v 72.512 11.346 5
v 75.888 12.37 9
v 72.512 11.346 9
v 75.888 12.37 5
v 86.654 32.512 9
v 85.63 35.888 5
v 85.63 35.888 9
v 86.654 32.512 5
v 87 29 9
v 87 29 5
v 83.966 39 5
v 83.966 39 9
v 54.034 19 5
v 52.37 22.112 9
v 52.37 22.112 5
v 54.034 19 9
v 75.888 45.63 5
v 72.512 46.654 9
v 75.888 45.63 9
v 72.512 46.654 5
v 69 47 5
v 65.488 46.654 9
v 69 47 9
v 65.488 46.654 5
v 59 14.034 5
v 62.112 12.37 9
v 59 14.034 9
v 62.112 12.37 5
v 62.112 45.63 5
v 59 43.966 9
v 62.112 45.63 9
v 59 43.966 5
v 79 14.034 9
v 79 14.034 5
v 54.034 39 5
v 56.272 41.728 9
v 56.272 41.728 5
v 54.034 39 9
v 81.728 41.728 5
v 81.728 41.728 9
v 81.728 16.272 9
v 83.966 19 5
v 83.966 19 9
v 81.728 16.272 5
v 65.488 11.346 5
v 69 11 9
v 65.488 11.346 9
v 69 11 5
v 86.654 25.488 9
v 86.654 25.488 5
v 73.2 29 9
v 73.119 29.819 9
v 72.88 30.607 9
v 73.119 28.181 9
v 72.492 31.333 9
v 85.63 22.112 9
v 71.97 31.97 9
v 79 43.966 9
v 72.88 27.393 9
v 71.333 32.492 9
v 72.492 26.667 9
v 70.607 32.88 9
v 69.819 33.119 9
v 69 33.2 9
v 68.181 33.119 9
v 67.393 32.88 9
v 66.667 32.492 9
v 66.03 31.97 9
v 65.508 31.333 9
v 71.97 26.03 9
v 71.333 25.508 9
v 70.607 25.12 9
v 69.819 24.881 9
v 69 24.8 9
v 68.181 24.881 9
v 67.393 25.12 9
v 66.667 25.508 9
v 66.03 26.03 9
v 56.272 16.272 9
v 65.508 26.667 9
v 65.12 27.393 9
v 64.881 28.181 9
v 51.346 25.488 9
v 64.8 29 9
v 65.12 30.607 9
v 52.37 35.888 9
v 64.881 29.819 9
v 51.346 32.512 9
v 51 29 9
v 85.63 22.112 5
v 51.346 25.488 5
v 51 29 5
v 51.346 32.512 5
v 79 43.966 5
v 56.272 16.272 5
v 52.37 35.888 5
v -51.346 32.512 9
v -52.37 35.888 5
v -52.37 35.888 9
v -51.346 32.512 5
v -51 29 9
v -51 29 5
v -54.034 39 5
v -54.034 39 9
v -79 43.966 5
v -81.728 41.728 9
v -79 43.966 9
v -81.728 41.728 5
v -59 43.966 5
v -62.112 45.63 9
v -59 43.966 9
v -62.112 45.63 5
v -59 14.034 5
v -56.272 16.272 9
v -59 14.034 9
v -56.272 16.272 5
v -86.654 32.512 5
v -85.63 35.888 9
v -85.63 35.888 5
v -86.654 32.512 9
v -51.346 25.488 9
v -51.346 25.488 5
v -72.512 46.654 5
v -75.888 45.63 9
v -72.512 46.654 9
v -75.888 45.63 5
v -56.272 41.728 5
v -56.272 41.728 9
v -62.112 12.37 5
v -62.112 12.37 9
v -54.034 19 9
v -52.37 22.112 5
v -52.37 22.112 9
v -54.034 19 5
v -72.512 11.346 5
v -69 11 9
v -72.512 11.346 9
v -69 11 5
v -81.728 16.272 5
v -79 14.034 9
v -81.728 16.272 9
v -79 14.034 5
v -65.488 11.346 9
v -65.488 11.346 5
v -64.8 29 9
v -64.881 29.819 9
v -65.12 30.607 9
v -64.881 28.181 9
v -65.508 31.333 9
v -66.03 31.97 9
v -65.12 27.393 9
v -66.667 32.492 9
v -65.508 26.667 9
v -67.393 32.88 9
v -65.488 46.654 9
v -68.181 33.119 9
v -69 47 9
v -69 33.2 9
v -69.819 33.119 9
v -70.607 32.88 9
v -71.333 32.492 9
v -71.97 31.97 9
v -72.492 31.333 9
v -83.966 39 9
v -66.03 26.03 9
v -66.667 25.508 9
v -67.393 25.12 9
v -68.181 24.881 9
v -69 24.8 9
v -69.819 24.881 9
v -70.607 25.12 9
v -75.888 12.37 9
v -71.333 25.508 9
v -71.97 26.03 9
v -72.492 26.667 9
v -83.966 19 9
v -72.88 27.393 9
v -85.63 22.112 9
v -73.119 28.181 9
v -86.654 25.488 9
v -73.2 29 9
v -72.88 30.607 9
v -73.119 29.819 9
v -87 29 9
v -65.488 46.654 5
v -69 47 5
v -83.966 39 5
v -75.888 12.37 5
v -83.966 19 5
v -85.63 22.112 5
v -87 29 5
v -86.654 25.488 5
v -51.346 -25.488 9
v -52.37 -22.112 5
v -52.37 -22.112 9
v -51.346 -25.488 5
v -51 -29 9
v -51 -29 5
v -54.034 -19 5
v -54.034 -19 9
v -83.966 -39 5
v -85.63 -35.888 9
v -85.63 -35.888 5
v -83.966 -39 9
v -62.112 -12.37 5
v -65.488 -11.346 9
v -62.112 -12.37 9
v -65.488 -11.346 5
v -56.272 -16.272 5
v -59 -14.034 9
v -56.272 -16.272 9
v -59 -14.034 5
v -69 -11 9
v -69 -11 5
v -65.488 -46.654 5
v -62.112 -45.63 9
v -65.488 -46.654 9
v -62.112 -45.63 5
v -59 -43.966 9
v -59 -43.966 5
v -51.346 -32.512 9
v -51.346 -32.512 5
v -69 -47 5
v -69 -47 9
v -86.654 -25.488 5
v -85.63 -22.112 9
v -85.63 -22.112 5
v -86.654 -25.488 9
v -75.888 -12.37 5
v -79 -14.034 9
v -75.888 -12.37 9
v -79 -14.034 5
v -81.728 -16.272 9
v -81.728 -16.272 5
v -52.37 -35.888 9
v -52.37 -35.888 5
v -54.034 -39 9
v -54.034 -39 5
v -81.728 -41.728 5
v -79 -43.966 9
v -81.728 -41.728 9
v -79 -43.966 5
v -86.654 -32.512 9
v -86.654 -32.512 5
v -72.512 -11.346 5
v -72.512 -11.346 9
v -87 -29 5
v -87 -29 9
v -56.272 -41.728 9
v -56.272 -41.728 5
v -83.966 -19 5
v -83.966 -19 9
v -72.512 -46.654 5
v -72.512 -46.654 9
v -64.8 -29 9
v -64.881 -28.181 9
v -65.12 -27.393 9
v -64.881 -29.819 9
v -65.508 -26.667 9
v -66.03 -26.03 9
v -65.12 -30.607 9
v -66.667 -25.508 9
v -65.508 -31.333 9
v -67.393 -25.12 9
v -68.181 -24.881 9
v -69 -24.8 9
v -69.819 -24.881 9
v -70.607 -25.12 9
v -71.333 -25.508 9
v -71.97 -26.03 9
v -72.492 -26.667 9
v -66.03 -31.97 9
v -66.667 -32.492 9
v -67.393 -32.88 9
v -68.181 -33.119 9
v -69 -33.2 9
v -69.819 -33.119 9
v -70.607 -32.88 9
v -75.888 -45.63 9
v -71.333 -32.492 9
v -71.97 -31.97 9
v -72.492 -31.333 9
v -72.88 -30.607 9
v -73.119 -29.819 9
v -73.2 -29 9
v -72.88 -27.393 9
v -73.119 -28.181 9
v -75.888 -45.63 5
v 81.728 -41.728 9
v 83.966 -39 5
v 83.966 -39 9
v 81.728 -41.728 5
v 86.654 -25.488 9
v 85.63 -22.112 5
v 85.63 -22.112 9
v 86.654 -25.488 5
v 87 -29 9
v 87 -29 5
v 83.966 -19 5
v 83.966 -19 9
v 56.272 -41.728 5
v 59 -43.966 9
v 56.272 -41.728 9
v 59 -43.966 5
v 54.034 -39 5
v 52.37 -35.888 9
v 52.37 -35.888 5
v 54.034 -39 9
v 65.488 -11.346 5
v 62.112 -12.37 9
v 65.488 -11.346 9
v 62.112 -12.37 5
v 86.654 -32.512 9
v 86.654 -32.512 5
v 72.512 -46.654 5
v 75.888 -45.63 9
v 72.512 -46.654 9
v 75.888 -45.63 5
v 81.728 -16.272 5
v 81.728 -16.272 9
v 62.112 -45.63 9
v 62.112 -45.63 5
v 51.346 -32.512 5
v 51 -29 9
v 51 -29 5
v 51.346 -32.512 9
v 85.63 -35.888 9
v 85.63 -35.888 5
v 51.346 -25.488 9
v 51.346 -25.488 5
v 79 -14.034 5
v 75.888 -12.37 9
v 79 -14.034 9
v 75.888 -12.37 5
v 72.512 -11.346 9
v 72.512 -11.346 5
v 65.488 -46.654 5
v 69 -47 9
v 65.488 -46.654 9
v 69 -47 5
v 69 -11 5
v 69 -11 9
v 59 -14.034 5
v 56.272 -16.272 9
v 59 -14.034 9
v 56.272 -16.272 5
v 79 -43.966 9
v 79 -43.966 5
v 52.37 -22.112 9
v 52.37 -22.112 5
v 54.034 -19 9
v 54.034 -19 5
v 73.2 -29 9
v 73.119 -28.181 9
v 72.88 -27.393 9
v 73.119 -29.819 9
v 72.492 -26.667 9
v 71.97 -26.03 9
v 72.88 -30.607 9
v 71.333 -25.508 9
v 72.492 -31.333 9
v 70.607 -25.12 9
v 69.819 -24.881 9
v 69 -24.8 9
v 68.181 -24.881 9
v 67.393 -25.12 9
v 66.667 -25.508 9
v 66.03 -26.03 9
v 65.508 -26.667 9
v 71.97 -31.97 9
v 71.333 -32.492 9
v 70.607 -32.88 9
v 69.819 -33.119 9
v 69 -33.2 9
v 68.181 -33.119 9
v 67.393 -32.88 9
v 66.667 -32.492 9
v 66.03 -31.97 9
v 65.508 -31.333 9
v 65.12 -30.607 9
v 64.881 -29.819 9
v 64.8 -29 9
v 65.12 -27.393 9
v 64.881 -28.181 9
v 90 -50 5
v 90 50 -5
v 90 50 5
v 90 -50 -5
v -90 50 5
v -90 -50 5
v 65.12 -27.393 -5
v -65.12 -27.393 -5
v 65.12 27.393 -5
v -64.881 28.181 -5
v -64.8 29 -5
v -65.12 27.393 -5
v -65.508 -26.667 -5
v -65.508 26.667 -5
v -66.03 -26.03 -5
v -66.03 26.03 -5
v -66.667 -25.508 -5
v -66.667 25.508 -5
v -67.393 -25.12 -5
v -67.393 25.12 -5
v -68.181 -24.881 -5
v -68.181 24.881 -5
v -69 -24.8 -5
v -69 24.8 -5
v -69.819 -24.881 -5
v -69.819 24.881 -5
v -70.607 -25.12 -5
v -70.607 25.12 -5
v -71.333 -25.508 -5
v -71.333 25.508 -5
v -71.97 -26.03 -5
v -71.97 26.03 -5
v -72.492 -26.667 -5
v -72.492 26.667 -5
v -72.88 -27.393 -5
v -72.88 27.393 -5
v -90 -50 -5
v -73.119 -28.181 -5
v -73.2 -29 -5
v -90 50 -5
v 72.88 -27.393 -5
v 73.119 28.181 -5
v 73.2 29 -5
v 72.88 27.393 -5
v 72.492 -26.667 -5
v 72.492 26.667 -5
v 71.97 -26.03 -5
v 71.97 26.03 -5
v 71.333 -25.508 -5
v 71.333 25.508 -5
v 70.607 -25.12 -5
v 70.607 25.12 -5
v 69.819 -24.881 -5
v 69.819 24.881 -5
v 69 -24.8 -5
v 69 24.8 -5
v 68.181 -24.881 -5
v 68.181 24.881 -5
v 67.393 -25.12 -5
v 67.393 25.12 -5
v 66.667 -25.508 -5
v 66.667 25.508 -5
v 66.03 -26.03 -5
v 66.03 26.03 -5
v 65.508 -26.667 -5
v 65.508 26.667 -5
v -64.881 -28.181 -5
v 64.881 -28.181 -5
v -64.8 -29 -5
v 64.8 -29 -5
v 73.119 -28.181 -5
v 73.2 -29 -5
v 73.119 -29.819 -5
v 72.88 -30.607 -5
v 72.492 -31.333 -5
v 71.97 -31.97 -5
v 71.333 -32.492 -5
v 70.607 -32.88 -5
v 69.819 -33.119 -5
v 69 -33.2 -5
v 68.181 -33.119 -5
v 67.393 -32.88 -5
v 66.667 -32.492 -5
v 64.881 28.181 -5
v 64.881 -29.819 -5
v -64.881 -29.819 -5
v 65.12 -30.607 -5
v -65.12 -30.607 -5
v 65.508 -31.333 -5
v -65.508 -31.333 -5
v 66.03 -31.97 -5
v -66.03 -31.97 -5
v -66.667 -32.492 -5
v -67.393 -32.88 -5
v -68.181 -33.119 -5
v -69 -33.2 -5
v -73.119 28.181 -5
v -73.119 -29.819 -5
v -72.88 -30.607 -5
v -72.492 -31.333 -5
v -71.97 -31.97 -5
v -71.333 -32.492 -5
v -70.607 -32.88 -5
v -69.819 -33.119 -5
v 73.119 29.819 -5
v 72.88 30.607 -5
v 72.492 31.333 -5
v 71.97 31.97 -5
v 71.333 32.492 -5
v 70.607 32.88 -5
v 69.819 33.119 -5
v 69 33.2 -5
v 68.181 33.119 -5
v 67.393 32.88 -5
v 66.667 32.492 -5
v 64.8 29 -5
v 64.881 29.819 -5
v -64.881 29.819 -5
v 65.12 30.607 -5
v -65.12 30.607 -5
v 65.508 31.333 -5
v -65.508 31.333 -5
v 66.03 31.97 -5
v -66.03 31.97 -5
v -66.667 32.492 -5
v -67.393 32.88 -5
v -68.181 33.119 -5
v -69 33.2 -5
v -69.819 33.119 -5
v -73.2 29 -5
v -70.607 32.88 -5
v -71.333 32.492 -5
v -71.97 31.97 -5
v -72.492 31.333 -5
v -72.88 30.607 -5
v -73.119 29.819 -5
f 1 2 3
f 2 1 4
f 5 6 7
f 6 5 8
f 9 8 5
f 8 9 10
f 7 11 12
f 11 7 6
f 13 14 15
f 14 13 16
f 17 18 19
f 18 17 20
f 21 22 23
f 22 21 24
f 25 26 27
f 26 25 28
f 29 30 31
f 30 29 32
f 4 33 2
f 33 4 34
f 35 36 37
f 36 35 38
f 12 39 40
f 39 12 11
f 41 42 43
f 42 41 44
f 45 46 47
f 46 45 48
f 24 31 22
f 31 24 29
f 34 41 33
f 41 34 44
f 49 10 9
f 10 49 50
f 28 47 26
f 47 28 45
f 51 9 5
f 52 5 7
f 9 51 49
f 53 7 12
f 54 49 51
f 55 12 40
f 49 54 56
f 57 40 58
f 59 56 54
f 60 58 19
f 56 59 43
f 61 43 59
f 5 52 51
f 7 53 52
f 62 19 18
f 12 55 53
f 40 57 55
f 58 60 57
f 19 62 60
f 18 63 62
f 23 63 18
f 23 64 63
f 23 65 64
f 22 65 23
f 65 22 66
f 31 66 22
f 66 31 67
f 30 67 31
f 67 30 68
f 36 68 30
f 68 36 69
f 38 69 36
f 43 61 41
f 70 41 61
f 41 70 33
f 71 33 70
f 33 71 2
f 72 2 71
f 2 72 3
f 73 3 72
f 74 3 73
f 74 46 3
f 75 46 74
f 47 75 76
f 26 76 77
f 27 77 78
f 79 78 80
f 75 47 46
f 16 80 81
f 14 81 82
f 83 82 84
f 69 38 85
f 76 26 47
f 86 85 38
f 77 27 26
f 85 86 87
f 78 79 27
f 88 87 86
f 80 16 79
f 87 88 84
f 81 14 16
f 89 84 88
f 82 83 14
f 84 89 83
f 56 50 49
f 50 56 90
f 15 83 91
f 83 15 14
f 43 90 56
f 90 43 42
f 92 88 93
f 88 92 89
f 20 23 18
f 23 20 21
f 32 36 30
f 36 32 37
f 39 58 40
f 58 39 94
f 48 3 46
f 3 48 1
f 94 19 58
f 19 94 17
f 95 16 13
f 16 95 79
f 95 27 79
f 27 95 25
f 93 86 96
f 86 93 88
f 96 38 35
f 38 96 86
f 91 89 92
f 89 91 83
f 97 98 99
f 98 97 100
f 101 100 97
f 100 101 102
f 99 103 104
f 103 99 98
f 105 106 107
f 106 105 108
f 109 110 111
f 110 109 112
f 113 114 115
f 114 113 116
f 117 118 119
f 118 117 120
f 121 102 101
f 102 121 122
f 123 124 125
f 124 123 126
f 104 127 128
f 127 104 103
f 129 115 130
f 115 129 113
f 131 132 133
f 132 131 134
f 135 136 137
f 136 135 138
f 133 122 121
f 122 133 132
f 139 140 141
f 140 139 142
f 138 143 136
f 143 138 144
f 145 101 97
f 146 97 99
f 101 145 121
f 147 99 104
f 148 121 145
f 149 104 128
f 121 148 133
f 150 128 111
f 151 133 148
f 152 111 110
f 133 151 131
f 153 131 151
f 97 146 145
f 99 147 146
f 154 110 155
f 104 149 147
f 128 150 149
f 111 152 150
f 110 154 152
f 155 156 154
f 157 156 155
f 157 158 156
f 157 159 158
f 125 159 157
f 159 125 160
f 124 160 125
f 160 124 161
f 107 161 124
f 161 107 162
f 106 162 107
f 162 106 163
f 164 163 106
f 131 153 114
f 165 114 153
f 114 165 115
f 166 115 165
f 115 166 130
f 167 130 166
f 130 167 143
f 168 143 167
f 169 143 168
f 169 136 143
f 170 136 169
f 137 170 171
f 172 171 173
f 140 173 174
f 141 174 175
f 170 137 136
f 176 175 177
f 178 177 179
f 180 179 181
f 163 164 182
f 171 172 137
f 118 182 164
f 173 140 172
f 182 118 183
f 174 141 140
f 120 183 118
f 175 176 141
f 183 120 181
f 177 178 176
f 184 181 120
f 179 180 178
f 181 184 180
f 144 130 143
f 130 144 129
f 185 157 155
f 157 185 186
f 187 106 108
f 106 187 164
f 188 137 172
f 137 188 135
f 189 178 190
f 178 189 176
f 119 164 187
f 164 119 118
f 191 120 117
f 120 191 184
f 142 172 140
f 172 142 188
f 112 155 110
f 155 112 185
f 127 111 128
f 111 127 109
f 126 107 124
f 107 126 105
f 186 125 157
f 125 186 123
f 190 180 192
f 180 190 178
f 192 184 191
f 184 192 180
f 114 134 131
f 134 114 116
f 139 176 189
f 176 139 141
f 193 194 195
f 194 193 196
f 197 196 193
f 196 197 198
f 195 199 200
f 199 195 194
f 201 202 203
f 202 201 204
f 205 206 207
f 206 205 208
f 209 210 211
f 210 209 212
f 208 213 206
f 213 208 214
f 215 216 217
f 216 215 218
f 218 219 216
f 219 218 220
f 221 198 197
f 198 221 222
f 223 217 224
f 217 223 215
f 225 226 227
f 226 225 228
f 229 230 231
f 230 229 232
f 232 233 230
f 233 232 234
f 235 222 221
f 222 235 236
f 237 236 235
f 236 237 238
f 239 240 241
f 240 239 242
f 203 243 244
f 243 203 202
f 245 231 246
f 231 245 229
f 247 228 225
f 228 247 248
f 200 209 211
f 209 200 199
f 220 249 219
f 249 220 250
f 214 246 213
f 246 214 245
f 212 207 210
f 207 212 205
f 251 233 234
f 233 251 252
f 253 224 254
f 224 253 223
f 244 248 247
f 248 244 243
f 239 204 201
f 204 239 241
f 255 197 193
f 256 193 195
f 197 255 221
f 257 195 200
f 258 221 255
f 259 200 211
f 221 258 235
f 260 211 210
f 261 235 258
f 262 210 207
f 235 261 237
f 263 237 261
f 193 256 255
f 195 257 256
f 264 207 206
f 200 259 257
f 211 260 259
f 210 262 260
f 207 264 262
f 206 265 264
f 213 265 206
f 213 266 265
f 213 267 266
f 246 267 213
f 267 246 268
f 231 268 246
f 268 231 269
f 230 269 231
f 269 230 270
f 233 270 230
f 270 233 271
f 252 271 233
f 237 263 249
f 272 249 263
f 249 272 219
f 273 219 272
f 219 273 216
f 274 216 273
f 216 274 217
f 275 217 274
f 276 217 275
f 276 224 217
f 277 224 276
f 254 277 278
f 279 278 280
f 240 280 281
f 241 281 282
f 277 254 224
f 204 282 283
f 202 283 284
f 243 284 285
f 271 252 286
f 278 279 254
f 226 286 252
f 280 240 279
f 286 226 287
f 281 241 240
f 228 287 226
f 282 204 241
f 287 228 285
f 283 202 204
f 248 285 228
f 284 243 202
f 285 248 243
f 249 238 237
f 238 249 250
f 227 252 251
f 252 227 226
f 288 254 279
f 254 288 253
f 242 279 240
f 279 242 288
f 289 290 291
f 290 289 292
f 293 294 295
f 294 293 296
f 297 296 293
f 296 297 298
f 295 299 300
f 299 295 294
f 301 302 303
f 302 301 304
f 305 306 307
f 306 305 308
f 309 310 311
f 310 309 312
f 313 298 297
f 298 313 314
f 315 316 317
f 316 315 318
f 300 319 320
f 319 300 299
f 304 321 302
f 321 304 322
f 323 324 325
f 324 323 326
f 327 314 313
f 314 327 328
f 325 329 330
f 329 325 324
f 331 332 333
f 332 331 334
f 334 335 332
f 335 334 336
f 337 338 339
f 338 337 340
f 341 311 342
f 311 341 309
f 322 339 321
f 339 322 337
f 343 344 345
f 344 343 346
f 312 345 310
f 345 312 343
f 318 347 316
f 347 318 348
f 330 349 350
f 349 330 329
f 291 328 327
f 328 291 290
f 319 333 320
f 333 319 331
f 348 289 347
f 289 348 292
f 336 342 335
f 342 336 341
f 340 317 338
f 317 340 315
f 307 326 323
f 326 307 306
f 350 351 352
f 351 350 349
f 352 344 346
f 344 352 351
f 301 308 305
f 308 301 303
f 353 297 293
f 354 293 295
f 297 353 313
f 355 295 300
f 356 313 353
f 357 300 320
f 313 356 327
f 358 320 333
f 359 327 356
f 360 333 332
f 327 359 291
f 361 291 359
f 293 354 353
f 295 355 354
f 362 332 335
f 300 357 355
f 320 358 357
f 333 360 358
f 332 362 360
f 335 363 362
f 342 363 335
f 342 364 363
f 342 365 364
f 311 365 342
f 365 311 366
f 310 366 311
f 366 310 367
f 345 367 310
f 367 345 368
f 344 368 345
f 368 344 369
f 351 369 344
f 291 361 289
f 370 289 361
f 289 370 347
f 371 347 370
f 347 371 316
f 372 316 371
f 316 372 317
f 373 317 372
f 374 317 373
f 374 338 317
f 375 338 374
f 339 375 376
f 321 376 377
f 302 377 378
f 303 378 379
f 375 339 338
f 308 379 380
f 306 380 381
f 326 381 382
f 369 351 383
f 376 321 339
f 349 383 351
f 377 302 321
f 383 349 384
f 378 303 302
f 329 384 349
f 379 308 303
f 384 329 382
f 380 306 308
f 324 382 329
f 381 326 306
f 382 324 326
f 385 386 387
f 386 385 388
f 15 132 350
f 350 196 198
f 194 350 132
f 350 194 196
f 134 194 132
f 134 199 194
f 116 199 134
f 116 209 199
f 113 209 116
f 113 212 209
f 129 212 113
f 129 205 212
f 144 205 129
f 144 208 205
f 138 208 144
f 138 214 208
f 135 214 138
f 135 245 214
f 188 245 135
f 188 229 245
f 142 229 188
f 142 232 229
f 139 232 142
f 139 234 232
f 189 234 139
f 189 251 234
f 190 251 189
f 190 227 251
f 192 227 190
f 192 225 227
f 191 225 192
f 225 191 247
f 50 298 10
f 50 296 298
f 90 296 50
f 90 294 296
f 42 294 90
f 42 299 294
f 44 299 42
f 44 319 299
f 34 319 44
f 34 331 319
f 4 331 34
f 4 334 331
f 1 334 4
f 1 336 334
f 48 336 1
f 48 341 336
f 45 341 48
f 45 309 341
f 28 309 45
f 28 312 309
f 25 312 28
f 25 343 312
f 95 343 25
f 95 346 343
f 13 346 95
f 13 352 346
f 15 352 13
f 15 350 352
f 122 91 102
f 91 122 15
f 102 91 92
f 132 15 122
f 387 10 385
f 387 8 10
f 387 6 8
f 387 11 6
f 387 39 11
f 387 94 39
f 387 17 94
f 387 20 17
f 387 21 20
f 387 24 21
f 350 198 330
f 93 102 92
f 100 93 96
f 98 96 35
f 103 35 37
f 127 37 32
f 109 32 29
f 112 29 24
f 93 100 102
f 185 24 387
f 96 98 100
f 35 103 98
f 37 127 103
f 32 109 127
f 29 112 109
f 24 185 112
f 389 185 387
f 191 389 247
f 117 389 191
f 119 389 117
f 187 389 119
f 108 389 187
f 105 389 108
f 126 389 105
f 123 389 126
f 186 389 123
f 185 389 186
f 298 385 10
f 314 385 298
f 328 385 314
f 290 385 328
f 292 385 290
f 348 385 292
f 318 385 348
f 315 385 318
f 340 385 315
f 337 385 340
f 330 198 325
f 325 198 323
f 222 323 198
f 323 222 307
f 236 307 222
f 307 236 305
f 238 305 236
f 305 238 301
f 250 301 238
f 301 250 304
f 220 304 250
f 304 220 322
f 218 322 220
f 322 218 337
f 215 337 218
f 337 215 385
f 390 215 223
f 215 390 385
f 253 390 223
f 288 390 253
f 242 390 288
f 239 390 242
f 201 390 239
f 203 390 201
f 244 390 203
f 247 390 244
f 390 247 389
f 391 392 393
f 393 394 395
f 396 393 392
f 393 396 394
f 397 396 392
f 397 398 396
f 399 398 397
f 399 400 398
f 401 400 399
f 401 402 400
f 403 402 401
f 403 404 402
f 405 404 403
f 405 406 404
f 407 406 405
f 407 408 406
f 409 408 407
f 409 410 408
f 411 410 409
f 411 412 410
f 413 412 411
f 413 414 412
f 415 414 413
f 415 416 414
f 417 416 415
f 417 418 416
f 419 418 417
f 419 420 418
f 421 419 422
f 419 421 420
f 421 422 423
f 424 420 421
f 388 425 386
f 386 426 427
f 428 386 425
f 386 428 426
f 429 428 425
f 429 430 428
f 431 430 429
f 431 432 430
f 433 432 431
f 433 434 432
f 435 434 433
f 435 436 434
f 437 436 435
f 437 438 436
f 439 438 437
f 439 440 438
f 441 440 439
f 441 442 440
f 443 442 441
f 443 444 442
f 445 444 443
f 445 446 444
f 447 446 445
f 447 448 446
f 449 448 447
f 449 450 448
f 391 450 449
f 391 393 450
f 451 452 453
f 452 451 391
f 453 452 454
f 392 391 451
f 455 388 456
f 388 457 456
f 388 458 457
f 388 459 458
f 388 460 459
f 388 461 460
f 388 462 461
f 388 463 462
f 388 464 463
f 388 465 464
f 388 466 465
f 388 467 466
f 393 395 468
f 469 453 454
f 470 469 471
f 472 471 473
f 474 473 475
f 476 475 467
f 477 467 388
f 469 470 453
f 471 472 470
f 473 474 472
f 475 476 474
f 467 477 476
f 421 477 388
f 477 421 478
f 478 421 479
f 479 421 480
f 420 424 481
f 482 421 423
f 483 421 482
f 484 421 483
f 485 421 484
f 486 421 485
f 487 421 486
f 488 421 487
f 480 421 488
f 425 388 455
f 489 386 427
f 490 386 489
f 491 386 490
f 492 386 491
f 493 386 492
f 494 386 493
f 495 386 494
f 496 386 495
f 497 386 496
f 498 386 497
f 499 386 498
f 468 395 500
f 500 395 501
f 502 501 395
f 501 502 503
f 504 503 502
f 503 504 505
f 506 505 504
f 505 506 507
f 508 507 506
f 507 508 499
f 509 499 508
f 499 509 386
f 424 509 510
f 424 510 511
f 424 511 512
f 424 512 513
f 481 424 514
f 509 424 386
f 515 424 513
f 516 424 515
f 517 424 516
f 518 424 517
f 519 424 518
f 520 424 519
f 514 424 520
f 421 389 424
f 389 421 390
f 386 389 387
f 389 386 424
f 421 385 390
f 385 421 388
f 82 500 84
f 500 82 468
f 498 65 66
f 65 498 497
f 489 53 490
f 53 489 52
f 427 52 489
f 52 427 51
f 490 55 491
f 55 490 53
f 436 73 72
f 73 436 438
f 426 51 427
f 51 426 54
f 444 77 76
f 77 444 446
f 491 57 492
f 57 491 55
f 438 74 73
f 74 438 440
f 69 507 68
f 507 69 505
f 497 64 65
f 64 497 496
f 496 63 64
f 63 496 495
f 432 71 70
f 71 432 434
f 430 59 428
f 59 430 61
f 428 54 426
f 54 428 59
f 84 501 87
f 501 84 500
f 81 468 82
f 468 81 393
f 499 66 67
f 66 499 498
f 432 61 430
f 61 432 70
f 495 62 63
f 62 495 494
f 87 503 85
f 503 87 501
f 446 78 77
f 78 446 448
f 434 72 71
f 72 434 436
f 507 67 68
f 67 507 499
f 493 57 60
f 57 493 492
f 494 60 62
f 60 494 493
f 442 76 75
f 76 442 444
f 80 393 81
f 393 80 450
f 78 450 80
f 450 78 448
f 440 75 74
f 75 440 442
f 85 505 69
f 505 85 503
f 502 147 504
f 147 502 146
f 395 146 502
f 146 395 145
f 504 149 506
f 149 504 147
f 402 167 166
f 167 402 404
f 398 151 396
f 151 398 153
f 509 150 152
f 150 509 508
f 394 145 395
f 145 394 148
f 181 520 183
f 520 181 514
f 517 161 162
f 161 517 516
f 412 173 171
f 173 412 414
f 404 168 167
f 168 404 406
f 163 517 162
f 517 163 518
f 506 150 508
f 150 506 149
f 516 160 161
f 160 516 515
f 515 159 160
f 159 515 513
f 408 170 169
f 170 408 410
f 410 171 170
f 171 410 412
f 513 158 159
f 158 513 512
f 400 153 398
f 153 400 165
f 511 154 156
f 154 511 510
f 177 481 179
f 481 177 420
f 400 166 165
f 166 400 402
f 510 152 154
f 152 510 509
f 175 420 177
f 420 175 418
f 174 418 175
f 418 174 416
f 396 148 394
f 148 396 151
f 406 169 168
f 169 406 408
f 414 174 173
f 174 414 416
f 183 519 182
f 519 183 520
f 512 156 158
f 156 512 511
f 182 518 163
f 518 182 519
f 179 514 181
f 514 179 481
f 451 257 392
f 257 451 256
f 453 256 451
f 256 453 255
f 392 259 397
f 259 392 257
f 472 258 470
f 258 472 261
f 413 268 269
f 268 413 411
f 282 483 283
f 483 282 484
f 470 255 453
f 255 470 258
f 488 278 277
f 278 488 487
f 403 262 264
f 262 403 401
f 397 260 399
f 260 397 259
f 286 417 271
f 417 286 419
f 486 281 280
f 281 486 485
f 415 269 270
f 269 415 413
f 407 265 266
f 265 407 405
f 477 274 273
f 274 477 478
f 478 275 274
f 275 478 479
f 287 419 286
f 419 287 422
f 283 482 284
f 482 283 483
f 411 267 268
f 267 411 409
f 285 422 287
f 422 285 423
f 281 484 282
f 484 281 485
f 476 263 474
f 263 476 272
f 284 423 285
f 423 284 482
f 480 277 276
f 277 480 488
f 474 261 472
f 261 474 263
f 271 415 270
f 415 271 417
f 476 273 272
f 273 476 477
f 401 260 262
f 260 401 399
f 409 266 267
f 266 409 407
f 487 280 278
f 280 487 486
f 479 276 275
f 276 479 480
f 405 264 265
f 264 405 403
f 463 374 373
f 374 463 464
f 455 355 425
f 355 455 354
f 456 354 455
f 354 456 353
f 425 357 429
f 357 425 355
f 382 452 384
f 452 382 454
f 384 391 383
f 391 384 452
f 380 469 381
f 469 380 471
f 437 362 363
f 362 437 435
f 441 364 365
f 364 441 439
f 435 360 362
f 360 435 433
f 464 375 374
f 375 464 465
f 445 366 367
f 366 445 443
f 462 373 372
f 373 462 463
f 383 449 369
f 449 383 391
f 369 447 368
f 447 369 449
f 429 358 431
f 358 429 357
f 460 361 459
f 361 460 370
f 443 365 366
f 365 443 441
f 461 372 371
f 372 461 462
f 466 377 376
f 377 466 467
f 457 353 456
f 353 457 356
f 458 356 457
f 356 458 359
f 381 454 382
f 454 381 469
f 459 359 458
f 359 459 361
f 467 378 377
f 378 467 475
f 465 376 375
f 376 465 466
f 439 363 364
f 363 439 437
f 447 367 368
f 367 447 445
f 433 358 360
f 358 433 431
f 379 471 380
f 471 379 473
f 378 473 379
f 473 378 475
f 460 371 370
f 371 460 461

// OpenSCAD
$fn = 32;

// ----------------------------------------------------------------------
// Anchor pads 180 x 100 x 14
// four corner bosses with anchor holes
// ----------------------------------------------------------------------

// --- parameters (mm) ---
plate = [180, 100, 10];  // base plate size (x, y, z)
pads = 4;                // boss count, one per corner
edge = 21;               // boss centre offset from the plate edge
boss_d = 36;             // boss diameter
boss_h = 4;              // boss height above the base plate
hole_d = 8.4;            // hole diameter

// --- derived feature positions (mm) ---
height = plate[2] + boss_h;      // = 14   overall height of the part
corner_x = plate[0] / 2 - edge;  // = 69   boss centre X
corner_y = plate[1] / 2 - edge;  // = 29   boss centre Y
feature_centers = [
  [corner_x, corner_y],
  [-corner_x, corner_y],
  [-corner_x, -corner_y],
  [corner_x, -corner_y]
];   // boss centres, anchor holes are drilled there

// base plate, four bosses standing on it, anchor holes all the way through
difference() {
  union() {
    cube(plate, center = true);
    for (centre = feature_centers)
      translate([centre[0], centre[1], plate[2] / 2 - 1])
        cylinder(d = boss_d, h = boss_h + 1);
  }
  for (centre = feature_centers)
    translate([centre[0], centre[1], -height])
      cylinder(d = hole_d, h = 2 * height + 2);  // through boss and plate
}
